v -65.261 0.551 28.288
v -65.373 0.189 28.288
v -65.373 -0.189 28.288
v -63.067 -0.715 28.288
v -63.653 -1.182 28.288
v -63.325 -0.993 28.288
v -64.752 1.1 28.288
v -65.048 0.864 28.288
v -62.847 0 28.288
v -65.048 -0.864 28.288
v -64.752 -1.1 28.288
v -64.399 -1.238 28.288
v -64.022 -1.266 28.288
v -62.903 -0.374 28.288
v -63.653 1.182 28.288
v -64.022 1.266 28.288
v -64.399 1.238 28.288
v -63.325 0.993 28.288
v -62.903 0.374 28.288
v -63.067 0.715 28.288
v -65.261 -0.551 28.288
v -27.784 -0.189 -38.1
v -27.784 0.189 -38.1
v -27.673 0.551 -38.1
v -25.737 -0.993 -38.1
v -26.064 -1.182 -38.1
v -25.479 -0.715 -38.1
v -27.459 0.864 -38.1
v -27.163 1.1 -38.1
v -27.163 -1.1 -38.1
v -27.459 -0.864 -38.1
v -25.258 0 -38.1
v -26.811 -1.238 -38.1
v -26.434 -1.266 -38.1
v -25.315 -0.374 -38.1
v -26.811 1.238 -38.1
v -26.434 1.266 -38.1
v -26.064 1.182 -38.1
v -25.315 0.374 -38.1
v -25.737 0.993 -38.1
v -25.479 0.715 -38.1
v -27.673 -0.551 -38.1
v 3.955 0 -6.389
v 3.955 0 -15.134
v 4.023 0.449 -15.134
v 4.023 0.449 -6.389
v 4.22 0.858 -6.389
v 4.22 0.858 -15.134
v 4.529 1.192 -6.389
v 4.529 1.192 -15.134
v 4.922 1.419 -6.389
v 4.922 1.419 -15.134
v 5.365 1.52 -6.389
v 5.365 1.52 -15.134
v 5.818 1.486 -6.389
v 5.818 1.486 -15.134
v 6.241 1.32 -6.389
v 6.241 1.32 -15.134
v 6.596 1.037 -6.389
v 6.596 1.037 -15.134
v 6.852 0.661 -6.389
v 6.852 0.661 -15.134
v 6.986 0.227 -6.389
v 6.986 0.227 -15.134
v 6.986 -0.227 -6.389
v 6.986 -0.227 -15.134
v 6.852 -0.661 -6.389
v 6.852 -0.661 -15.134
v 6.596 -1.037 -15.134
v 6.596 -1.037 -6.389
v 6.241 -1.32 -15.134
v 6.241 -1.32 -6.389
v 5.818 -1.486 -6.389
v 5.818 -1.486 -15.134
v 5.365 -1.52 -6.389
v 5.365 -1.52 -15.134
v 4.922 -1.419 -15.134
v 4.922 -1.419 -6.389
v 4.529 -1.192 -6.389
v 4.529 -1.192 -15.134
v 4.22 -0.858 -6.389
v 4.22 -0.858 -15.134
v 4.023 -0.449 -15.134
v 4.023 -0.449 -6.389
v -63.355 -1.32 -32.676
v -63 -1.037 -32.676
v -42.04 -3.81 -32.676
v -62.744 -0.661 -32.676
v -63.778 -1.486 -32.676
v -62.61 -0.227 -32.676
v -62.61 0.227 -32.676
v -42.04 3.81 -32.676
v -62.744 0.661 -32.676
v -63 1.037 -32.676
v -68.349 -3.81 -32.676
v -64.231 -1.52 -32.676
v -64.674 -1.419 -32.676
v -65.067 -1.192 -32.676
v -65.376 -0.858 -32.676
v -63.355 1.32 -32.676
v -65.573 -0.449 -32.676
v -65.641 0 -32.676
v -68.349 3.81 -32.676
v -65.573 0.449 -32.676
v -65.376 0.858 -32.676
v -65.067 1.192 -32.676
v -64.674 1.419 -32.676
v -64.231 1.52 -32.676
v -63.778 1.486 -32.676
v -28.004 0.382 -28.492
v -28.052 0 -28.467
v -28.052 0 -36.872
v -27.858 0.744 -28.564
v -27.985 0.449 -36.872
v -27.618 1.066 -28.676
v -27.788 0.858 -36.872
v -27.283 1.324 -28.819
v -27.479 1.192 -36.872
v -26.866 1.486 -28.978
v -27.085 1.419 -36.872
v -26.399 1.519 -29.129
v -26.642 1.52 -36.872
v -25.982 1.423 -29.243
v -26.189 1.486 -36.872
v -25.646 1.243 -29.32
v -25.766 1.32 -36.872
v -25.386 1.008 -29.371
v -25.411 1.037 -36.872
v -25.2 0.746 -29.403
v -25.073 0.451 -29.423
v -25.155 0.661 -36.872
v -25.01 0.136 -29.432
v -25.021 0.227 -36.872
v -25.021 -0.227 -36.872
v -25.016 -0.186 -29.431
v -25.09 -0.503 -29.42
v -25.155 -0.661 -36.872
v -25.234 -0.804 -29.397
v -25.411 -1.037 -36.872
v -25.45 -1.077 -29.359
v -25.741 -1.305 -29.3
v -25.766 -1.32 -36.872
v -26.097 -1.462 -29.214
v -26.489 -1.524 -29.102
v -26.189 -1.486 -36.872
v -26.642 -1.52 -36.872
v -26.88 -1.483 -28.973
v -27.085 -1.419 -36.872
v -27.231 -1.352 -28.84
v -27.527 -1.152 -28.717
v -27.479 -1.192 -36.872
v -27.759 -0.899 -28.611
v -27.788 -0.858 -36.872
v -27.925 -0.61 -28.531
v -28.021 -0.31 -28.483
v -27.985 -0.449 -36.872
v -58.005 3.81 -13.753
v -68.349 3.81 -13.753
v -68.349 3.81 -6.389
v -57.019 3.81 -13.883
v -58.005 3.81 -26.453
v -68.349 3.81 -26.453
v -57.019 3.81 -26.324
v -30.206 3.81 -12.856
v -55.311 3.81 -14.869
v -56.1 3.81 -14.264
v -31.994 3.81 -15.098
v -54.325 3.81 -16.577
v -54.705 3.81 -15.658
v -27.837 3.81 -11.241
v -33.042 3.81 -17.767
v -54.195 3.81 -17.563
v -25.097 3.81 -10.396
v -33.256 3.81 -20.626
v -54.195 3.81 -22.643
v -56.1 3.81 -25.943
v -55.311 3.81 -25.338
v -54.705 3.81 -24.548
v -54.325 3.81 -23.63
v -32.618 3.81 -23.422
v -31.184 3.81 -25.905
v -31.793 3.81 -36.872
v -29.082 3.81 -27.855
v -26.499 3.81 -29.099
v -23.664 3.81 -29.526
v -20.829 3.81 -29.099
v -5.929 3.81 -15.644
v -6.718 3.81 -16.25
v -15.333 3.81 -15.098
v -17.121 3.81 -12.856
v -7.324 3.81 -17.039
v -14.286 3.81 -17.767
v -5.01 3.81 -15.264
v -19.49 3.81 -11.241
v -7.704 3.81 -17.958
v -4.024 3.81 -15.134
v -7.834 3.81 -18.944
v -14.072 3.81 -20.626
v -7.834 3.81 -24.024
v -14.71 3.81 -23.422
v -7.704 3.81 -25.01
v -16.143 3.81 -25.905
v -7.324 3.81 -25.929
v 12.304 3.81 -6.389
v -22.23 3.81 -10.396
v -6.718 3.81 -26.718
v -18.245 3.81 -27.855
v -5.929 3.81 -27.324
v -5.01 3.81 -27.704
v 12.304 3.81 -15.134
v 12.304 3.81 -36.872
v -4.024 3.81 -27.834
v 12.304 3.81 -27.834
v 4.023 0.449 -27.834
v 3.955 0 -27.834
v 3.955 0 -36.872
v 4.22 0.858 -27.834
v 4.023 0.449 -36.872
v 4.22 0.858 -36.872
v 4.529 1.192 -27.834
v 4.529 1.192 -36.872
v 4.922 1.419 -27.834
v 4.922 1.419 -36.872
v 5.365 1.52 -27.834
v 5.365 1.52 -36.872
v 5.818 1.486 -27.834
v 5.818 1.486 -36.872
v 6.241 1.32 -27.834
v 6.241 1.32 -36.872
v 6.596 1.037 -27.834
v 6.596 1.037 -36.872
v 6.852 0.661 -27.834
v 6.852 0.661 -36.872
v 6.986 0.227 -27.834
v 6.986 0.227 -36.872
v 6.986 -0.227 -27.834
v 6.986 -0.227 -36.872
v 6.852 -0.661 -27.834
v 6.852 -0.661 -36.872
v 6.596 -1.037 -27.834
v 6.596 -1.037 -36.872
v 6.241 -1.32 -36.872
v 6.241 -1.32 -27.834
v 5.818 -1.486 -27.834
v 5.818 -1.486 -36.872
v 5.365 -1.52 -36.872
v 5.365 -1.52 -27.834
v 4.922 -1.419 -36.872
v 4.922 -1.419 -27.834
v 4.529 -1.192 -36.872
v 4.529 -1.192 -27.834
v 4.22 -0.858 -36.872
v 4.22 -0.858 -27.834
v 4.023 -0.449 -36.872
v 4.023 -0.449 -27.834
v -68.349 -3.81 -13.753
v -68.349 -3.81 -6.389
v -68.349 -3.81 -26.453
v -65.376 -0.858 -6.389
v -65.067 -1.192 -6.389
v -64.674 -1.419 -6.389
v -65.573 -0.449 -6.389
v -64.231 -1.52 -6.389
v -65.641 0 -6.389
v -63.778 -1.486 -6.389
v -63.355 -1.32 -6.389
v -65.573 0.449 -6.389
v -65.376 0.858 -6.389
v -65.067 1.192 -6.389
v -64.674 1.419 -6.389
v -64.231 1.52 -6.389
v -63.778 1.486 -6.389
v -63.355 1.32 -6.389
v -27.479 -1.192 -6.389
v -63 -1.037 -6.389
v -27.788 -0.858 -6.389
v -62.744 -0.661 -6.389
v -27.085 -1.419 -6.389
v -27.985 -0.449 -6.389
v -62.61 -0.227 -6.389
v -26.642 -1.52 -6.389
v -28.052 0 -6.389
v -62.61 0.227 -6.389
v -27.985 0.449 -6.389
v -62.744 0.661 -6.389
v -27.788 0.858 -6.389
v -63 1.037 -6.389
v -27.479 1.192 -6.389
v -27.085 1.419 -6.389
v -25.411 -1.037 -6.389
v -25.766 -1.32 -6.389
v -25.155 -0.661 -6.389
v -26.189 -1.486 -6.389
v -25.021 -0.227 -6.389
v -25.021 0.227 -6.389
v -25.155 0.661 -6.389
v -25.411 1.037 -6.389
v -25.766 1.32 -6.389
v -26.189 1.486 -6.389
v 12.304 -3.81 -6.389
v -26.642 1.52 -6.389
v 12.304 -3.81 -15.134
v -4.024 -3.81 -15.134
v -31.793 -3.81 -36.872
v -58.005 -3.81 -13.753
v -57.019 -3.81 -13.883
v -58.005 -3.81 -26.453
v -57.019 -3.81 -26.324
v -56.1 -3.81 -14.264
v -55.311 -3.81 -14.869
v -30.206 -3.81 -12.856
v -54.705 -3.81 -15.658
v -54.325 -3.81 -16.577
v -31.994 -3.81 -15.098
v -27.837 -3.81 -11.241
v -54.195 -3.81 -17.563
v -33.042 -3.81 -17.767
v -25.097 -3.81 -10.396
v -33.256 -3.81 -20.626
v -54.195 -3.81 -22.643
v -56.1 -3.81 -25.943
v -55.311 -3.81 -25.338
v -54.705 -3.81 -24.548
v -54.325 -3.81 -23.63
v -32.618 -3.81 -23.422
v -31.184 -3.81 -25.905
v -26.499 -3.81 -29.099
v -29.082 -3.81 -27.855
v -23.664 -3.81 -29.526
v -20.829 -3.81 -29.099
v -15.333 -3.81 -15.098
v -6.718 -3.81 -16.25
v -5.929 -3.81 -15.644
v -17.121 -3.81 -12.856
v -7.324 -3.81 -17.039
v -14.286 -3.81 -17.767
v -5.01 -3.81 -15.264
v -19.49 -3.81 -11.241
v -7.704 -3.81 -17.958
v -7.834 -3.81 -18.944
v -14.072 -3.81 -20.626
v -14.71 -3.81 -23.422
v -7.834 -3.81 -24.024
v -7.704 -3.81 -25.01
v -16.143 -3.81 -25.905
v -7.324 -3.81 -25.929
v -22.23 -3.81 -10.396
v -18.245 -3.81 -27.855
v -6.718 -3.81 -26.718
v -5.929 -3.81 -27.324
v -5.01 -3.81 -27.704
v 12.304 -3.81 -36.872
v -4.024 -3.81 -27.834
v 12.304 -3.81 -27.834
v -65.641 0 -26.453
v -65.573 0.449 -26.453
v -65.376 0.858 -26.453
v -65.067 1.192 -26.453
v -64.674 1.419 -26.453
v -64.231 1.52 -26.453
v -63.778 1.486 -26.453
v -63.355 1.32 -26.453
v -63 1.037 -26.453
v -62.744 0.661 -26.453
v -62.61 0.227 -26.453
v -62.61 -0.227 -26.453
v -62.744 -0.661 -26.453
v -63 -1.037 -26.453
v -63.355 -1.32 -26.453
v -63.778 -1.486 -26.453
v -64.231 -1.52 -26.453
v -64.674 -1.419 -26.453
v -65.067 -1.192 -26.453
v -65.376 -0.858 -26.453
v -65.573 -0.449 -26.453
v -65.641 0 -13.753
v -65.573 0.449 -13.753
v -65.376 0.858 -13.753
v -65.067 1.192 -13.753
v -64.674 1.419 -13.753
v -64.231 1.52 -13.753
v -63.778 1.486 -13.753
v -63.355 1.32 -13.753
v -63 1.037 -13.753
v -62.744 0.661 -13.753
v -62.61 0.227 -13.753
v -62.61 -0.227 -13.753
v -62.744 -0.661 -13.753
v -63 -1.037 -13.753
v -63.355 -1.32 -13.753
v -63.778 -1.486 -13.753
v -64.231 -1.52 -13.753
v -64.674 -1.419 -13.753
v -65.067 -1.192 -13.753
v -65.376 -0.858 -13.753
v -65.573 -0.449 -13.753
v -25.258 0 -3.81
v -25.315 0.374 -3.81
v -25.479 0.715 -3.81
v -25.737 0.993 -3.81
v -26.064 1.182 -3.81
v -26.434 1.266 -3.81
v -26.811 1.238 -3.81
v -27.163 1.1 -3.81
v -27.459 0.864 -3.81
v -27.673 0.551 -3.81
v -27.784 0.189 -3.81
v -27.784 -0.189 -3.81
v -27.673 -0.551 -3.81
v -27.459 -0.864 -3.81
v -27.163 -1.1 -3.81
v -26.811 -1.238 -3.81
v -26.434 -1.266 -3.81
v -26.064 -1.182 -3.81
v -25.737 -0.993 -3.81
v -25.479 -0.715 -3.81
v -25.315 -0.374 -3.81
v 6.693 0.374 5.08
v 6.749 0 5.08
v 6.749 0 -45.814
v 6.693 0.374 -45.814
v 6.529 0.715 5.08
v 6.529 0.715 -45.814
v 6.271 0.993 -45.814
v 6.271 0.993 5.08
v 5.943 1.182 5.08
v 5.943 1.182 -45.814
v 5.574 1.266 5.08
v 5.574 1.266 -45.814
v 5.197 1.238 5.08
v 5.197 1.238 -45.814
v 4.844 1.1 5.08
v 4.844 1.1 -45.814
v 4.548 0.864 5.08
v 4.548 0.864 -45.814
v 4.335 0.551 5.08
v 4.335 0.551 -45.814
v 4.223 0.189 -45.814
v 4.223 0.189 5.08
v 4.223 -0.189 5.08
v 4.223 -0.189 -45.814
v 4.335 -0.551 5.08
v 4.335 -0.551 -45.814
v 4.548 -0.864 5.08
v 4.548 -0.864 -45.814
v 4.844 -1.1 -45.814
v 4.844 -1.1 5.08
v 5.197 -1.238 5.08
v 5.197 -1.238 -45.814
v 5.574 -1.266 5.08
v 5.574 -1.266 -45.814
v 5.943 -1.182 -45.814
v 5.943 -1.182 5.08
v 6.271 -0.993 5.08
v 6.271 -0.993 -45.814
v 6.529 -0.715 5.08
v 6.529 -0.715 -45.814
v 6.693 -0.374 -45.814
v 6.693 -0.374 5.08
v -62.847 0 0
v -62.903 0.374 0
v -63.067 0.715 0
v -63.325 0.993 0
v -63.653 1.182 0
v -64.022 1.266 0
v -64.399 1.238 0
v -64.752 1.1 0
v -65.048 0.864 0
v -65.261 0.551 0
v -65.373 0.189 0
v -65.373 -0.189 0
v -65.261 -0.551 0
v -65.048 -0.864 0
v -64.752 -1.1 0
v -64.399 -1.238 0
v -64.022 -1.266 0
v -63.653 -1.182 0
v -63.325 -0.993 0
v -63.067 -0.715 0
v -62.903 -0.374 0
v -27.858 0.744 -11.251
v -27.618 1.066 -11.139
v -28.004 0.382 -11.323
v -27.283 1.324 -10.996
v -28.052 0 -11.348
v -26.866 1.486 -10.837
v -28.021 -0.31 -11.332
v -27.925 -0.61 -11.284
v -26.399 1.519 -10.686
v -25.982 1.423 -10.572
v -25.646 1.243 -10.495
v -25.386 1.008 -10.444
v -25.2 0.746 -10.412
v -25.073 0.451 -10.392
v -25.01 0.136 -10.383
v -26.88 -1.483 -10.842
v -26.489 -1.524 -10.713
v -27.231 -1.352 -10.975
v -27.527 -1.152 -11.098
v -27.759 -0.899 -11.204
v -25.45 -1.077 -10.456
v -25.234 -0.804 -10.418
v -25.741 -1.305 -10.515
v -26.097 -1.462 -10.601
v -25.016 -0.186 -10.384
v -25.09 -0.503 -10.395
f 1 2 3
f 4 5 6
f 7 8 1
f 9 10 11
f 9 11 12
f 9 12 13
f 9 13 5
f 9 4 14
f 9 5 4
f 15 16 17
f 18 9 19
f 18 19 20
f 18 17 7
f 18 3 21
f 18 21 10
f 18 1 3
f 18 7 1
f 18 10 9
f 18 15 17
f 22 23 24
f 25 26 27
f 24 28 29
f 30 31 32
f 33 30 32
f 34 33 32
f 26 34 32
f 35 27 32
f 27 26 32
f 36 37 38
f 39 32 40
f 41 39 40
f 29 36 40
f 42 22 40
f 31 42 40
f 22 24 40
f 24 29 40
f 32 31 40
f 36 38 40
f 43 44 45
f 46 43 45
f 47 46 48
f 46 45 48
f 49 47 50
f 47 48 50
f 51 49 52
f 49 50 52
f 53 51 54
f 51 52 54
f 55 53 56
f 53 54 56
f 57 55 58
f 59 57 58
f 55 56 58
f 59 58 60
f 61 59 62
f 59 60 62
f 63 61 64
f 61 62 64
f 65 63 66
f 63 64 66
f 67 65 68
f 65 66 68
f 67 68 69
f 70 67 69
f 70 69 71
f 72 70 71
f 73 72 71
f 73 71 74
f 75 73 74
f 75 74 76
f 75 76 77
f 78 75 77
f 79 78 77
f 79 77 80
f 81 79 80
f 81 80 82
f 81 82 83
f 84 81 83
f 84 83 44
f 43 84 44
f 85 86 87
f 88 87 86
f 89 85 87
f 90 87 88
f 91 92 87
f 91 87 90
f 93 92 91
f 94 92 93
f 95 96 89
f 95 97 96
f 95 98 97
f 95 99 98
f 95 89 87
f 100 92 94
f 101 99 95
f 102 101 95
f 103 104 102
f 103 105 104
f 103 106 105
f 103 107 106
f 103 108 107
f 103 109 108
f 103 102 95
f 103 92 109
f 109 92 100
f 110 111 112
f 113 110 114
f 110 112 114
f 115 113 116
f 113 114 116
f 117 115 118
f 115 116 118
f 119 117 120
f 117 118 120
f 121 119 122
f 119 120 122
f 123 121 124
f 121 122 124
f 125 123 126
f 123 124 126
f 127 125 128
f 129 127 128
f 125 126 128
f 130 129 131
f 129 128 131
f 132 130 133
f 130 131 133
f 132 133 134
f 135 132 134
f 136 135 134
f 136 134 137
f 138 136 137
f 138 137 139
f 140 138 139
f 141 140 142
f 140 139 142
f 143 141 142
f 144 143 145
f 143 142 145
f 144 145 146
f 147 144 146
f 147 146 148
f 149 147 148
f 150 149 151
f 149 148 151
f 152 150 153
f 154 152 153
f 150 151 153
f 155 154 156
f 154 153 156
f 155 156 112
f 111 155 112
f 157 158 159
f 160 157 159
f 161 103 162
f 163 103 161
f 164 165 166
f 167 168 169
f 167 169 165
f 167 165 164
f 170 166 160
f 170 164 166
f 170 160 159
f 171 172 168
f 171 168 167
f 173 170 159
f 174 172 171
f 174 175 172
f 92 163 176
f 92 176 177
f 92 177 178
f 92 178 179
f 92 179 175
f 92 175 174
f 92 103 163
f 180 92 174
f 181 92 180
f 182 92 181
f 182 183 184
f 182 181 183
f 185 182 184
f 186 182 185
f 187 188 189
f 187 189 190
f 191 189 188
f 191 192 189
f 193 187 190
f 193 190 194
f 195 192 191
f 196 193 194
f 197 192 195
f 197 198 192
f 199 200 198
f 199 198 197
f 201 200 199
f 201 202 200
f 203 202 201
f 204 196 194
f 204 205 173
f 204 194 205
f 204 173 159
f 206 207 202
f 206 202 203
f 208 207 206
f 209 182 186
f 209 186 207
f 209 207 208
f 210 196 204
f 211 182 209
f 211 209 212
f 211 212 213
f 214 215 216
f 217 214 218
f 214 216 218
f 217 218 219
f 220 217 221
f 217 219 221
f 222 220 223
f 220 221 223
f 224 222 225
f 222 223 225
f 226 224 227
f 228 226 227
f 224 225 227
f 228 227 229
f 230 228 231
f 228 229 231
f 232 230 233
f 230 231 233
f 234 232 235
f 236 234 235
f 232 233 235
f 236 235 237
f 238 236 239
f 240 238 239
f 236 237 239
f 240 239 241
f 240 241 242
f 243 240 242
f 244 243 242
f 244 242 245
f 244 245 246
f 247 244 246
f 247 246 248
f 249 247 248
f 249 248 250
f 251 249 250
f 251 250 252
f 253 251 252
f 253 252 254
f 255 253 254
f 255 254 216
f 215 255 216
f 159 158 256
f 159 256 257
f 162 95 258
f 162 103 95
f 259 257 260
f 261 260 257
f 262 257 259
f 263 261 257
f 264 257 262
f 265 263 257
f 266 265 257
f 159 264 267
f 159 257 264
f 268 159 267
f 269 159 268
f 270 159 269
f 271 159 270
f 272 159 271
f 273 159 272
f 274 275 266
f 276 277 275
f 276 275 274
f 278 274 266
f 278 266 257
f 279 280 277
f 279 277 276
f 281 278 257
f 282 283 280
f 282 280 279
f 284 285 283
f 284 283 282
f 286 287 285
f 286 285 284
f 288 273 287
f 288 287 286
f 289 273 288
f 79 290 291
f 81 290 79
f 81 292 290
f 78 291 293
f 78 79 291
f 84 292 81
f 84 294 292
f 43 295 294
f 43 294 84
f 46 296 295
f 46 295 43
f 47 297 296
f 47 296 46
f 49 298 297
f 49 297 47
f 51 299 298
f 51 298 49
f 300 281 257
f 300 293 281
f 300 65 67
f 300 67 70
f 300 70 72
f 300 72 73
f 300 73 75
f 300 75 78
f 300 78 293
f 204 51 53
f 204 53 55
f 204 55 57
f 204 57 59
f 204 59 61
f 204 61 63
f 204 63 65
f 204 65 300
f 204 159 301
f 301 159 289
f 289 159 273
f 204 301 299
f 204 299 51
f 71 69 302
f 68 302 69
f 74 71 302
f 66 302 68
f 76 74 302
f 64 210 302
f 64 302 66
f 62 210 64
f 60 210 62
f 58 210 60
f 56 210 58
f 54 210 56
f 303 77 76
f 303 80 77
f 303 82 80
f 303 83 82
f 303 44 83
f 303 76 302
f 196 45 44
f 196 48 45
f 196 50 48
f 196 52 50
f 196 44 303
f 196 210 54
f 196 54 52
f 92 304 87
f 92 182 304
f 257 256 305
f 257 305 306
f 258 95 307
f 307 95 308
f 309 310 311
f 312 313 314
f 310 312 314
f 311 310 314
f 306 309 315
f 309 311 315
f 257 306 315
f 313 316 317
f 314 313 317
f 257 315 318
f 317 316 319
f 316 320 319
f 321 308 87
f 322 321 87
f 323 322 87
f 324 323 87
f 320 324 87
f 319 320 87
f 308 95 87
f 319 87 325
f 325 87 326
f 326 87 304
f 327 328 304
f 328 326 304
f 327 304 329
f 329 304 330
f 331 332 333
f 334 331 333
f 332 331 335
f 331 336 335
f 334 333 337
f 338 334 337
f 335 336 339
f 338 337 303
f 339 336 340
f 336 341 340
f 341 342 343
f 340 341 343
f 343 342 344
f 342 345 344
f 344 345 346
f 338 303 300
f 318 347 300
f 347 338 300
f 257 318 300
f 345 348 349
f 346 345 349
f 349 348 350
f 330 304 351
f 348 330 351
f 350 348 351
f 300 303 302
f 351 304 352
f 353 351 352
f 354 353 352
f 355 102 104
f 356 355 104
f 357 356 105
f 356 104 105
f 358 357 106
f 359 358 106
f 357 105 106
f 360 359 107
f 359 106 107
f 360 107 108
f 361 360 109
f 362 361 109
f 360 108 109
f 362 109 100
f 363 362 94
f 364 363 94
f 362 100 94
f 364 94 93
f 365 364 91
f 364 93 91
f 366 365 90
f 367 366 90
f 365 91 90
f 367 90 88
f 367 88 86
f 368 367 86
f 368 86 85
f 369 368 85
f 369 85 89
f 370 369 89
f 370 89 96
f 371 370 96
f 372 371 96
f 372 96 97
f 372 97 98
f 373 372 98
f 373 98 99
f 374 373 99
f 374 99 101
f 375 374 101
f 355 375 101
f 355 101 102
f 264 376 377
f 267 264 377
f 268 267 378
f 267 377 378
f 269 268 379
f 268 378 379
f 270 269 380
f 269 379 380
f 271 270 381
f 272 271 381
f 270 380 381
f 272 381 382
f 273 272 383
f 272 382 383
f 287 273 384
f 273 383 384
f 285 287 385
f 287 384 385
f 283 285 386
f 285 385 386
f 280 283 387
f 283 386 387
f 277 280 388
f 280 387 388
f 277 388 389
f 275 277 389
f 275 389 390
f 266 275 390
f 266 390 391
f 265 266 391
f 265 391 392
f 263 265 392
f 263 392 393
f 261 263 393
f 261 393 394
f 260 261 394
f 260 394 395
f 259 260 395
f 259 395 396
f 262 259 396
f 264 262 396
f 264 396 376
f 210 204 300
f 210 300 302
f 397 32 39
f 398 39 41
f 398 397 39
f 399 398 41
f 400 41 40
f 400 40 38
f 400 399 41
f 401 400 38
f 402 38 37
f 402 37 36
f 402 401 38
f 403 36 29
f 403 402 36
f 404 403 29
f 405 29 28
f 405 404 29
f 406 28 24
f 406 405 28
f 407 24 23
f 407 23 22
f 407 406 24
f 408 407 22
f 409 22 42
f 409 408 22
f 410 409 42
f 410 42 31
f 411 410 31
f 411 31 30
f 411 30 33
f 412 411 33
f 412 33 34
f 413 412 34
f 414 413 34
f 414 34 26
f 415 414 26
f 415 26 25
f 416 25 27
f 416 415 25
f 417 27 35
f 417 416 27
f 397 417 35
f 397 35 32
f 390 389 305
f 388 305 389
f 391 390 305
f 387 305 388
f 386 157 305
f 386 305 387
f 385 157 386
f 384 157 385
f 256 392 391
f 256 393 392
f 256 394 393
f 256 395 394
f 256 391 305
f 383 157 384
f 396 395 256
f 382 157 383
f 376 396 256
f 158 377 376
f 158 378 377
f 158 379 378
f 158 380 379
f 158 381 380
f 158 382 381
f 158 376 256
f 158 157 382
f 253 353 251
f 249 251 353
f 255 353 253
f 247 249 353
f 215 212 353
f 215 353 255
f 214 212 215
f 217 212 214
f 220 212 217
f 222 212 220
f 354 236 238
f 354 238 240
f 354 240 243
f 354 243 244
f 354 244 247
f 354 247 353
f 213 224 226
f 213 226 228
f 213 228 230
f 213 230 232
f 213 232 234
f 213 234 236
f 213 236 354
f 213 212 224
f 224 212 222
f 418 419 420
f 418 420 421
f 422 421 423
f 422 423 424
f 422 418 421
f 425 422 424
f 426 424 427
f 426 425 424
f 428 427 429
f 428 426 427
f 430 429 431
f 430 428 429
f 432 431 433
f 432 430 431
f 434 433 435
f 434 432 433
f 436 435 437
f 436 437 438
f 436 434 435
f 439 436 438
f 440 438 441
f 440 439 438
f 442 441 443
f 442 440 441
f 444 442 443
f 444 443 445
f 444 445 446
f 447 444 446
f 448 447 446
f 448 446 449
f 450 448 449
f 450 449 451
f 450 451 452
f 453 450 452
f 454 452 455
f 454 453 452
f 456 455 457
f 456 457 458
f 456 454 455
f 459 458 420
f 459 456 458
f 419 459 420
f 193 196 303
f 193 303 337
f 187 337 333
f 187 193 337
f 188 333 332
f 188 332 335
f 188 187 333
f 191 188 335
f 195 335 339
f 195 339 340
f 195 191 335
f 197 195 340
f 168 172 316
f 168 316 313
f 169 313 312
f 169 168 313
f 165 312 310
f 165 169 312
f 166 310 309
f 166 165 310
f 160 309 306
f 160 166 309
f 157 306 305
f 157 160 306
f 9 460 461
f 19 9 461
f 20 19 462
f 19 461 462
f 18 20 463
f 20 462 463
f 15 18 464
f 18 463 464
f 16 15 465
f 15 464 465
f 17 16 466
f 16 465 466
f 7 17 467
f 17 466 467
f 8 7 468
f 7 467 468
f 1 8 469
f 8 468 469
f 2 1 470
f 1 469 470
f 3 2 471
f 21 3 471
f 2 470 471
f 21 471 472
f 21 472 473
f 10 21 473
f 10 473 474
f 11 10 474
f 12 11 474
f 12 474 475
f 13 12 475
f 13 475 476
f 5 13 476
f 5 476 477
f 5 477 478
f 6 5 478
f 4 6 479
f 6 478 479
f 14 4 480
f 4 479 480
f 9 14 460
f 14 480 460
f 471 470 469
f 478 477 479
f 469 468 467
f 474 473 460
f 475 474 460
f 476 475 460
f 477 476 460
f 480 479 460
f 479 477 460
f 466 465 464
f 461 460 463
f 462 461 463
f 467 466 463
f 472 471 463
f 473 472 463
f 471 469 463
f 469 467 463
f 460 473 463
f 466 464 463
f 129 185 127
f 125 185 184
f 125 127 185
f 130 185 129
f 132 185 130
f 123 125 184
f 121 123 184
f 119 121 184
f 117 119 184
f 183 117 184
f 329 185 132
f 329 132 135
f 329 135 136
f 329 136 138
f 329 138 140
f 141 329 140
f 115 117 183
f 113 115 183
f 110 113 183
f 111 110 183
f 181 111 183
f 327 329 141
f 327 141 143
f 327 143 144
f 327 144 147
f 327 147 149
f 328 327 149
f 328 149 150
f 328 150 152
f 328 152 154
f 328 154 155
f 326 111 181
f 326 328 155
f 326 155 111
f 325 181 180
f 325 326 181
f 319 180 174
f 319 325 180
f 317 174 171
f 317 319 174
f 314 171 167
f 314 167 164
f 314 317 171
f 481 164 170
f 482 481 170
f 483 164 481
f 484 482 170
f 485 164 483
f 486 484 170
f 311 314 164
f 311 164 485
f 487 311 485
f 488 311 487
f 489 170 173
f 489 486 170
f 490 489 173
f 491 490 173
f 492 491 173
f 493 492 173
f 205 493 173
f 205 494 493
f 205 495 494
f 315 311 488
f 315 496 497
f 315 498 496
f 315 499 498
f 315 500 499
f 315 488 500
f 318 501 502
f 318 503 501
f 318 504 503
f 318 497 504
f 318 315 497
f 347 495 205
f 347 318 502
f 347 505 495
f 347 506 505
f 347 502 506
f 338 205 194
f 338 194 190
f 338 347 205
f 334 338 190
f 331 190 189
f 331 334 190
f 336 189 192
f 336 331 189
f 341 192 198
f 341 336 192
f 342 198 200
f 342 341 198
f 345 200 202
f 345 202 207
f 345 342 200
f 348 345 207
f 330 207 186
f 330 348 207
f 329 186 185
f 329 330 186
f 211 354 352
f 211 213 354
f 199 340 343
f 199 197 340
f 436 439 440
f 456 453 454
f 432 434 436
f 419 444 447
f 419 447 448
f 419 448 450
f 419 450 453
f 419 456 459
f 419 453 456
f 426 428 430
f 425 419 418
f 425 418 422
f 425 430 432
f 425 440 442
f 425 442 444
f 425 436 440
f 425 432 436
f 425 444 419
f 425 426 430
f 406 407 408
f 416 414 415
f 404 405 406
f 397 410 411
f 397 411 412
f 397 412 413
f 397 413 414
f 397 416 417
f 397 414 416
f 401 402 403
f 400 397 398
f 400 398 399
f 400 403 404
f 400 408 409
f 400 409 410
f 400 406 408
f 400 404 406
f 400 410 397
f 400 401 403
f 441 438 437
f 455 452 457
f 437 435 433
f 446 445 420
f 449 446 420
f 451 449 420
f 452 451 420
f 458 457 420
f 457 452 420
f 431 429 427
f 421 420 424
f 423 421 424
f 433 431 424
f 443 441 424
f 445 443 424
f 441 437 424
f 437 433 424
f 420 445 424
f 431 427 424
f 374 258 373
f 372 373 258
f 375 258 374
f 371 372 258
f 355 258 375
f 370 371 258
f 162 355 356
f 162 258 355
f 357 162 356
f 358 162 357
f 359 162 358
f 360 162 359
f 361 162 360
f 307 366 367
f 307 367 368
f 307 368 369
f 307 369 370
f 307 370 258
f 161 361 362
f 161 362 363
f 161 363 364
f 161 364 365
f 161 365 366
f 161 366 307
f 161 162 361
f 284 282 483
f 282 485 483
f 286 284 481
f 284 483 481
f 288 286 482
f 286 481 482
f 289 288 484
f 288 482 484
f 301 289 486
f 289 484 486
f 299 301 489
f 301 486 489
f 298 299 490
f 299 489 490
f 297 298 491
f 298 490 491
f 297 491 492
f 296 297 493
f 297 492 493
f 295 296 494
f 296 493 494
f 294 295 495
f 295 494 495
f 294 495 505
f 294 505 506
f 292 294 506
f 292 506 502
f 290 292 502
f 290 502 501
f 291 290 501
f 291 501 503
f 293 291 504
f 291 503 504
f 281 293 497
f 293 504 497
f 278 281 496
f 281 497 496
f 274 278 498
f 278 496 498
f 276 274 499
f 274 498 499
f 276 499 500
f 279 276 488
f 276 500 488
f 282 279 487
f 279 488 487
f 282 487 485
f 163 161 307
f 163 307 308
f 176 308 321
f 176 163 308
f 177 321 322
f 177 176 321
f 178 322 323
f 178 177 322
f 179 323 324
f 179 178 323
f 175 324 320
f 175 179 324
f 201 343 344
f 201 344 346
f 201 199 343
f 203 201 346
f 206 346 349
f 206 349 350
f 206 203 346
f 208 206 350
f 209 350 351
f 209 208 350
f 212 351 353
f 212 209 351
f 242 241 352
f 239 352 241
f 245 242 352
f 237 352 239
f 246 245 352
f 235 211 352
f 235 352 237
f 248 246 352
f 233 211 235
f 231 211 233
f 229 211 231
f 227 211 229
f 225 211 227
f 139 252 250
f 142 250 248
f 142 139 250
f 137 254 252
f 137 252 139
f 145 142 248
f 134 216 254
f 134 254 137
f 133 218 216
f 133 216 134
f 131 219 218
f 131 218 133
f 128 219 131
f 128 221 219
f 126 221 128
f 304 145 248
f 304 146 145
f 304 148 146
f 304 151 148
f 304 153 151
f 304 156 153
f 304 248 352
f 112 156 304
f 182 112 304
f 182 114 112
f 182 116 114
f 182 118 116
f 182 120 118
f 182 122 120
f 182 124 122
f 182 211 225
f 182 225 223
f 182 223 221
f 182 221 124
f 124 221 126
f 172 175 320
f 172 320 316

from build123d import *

# Parameters (mm, degrees)
SKETCH21_R         = 9.618966791
EXTRUDE1_DEPTH     = 3.81
SKETCH22_R         = 1.524
CUT_EXTRUDE1_DEPTH = 91.7575
EXTRUDE2_START     = -3.81
SKETCH24_R         = 1.27
EXTRUDE2_DEPTH     = 34.29
SKETCH24_3_R       = 1.27
EXTRUDE3_DEPTH     = 28.288
EXTRUDE4_START     = 5.08
SKETCH24_4_R       = 1.27
EXTRUDE4_DEPTH     = 50.894


with BuildPart() as part:
    # Sketch21 → Extrude1 (new, symmetric)
    with BuildSketch(Plane(origin=(0, 0, 0), x_dir=(1, 0, 0), z_dir=(0, 1, 0))):
        with BuildLine():
            Line((-68.34927062, 26.453430618), (-58.004863859, 26.453430618))
            ThreePointArc((-58.004863859, 26.453430618), (-55.310787023, 25.337507455), (-54.194863859, 22.643430618))
            Line((-54.194863859, 22.643430618), (-54.194863859, 17.563430618))
            ThreePointArc((-54.194863859, 17.563430618), (-55.310787023, 14.869353782), (-58.004863859, 13.753430618))
            Line((-58.004863859, 13.753430618), (-68.34927062, 13.753430618))
            Line((-68.34927062, 13.753430618), (-68.34927062, 6.389220304))
            Line((-68.34927062, 6.389220304), (12.303763798, 6.389220304))
            Line((12.303763798, 6.389220304), (12.303763798, 15.133953501))
            Line((12.303763798, 15.133953501), (-4.02424507, 15.133953501))
            ThreePointArc((-4.02424507, 15.133953501), (-6.718321906, 16.249876665), (-7.83424507, 18.943953501))
            Line((-7.83424507, 18.943953501), (-7.83424507, 24.023953501))
            ThreePointArc((-7.83424507, 24.023953501), (-6.718321906, 26.718030338), (-4.02424507, 27.833953501))
            Line((-4.02424507, 27.833953501), (12.303763798, 27.833953501))
            Line((12.303763798, 27.833953501), (12.303763798, 36.872358218))
            Line((12.303763798, 36.872358218), (-31.792837082, 36.872358218))
            Line((-31.792837082, 36.872358218), (-42.039547436, 32.676430618))
            Line((-42.039547436, 32.676430618), (-68.34927062, 32.676430618))
            Line((-68.34927062, 32.676430618), (-68.34927062, 26.453430618))
        make_face()
        with Locations((-23.6637447, 19.907505249)):
            Circle(SKETCH21_R, mode=Mode.SUBTRACT)
    extrude(amount=EXTRUDE1_DEPTH, both=True)

    # Sketch22 → Cut-Extrude1 (cut, symmetric)
    with BuildSketch(Plane(origin=(0, 0, -36.872358218), x_dir=(-1, 0, 0), z_dir=(0, 0, -1))):
        with Locations((-5.47919097, 0)):
            Circle(SKETCH22_R)
        with Locations((64.11680903, 0)):
            Circle(SKETCH22_R)
        with Locations((26.528431516, 0)):
            Circle(SKETCH22_R)
    extrude(amount=CUT_EXTRUDE1_DEPTH, both=True, mode=Mode.SUBTRACT)


with BuildPart() as body_2:
    # Sketch24 → Extrude2 (new body)
    with BuildSketch(Plane.XY.offset(EXTRUDE2_START)):
        with Locations((-26.528431516, 0)):
            Circle(SKETCH24_R)
    extrude(amount=-EXTRUDE2_DEPTH)


with BuildPart() as body_3:
    # Sketch24<3> → Extrude3 (new body)
    with BuildSketch(Plane.XY):
        with Locations((-64.11680903, 0)):
            Circle(SKETCH24_3_R)
    extrude(amount=EXTRUDE3_DEPTH)


with BuildPart() as body_4:
    # Sketch24<4> → Extrude4 (new body)
    with BuildSketch(Plane.XY.offset(EXTRUDE4_START)):
        with Locations((5.47919097, 0)):
            Circle(SKETCH24_4_R)
    extrude(amount=-EXTRUDE4_DEPTH)


solid = Compound([part.part, body_2.part, body_3.part, body_4.part])
